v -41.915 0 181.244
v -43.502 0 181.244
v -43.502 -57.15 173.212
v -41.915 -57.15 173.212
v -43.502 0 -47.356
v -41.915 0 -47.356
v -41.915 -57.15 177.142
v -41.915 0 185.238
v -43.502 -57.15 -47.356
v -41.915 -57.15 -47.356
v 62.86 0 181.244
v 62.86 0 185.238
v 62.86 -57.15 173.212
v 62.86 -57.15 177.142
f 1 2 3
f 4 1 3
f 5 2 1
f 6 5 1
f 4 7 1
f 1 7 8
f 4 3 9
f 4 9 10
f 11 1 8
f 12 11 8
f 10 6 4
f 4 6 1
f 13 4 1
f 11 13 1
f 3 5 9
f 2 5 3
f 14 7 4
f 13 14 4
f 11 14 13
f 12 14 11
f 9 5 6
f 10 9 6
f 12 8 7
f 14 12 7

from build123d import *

# Parameters (mm, degrees)
F0_W     = 1.5875
F0_H     = 228.6
F1_DEPTH = 57.15
F3_DEPTH = 1.5875
F5_DEPTH = 104.775


with BuildPart() as f1:
    # F0 (on Front) → F1 (new body)
    with BuildSketch(Plane.XZ):
        with Locations((-42.70866, 66.94439)):
            Rectangle(F0_W, F0_H)
    extrude(amount=F1_DEPTH)

    # F2 (on face) → F3 (cut, through all)
    with BuildSketch(Plane(origin=(-43.50241, 0, 0), x_dir=(0, -1, 0), z_dir=(-1, 0, 0))):
        Polygon((57.15, 181.24439), (0, 181.24439), (57.15, 173.212482), align=None)
    extrude(amount=-F3_DEPTH, mode=Mode.SUBTRACT)


with BuildPart() as f5:
    # F4 (on face) → F5 (new body)
    with BuildSketch(Plane.YZ.offset(-41.91491)):
        Polygon((-57.15, 177.142054), (-57.15, 173.212482), (0, 181.24439), (0, 185.237545), align=None)
    extrude(amount=F5_DEPTH)


solid = Compound([f1.part, f5.part])
